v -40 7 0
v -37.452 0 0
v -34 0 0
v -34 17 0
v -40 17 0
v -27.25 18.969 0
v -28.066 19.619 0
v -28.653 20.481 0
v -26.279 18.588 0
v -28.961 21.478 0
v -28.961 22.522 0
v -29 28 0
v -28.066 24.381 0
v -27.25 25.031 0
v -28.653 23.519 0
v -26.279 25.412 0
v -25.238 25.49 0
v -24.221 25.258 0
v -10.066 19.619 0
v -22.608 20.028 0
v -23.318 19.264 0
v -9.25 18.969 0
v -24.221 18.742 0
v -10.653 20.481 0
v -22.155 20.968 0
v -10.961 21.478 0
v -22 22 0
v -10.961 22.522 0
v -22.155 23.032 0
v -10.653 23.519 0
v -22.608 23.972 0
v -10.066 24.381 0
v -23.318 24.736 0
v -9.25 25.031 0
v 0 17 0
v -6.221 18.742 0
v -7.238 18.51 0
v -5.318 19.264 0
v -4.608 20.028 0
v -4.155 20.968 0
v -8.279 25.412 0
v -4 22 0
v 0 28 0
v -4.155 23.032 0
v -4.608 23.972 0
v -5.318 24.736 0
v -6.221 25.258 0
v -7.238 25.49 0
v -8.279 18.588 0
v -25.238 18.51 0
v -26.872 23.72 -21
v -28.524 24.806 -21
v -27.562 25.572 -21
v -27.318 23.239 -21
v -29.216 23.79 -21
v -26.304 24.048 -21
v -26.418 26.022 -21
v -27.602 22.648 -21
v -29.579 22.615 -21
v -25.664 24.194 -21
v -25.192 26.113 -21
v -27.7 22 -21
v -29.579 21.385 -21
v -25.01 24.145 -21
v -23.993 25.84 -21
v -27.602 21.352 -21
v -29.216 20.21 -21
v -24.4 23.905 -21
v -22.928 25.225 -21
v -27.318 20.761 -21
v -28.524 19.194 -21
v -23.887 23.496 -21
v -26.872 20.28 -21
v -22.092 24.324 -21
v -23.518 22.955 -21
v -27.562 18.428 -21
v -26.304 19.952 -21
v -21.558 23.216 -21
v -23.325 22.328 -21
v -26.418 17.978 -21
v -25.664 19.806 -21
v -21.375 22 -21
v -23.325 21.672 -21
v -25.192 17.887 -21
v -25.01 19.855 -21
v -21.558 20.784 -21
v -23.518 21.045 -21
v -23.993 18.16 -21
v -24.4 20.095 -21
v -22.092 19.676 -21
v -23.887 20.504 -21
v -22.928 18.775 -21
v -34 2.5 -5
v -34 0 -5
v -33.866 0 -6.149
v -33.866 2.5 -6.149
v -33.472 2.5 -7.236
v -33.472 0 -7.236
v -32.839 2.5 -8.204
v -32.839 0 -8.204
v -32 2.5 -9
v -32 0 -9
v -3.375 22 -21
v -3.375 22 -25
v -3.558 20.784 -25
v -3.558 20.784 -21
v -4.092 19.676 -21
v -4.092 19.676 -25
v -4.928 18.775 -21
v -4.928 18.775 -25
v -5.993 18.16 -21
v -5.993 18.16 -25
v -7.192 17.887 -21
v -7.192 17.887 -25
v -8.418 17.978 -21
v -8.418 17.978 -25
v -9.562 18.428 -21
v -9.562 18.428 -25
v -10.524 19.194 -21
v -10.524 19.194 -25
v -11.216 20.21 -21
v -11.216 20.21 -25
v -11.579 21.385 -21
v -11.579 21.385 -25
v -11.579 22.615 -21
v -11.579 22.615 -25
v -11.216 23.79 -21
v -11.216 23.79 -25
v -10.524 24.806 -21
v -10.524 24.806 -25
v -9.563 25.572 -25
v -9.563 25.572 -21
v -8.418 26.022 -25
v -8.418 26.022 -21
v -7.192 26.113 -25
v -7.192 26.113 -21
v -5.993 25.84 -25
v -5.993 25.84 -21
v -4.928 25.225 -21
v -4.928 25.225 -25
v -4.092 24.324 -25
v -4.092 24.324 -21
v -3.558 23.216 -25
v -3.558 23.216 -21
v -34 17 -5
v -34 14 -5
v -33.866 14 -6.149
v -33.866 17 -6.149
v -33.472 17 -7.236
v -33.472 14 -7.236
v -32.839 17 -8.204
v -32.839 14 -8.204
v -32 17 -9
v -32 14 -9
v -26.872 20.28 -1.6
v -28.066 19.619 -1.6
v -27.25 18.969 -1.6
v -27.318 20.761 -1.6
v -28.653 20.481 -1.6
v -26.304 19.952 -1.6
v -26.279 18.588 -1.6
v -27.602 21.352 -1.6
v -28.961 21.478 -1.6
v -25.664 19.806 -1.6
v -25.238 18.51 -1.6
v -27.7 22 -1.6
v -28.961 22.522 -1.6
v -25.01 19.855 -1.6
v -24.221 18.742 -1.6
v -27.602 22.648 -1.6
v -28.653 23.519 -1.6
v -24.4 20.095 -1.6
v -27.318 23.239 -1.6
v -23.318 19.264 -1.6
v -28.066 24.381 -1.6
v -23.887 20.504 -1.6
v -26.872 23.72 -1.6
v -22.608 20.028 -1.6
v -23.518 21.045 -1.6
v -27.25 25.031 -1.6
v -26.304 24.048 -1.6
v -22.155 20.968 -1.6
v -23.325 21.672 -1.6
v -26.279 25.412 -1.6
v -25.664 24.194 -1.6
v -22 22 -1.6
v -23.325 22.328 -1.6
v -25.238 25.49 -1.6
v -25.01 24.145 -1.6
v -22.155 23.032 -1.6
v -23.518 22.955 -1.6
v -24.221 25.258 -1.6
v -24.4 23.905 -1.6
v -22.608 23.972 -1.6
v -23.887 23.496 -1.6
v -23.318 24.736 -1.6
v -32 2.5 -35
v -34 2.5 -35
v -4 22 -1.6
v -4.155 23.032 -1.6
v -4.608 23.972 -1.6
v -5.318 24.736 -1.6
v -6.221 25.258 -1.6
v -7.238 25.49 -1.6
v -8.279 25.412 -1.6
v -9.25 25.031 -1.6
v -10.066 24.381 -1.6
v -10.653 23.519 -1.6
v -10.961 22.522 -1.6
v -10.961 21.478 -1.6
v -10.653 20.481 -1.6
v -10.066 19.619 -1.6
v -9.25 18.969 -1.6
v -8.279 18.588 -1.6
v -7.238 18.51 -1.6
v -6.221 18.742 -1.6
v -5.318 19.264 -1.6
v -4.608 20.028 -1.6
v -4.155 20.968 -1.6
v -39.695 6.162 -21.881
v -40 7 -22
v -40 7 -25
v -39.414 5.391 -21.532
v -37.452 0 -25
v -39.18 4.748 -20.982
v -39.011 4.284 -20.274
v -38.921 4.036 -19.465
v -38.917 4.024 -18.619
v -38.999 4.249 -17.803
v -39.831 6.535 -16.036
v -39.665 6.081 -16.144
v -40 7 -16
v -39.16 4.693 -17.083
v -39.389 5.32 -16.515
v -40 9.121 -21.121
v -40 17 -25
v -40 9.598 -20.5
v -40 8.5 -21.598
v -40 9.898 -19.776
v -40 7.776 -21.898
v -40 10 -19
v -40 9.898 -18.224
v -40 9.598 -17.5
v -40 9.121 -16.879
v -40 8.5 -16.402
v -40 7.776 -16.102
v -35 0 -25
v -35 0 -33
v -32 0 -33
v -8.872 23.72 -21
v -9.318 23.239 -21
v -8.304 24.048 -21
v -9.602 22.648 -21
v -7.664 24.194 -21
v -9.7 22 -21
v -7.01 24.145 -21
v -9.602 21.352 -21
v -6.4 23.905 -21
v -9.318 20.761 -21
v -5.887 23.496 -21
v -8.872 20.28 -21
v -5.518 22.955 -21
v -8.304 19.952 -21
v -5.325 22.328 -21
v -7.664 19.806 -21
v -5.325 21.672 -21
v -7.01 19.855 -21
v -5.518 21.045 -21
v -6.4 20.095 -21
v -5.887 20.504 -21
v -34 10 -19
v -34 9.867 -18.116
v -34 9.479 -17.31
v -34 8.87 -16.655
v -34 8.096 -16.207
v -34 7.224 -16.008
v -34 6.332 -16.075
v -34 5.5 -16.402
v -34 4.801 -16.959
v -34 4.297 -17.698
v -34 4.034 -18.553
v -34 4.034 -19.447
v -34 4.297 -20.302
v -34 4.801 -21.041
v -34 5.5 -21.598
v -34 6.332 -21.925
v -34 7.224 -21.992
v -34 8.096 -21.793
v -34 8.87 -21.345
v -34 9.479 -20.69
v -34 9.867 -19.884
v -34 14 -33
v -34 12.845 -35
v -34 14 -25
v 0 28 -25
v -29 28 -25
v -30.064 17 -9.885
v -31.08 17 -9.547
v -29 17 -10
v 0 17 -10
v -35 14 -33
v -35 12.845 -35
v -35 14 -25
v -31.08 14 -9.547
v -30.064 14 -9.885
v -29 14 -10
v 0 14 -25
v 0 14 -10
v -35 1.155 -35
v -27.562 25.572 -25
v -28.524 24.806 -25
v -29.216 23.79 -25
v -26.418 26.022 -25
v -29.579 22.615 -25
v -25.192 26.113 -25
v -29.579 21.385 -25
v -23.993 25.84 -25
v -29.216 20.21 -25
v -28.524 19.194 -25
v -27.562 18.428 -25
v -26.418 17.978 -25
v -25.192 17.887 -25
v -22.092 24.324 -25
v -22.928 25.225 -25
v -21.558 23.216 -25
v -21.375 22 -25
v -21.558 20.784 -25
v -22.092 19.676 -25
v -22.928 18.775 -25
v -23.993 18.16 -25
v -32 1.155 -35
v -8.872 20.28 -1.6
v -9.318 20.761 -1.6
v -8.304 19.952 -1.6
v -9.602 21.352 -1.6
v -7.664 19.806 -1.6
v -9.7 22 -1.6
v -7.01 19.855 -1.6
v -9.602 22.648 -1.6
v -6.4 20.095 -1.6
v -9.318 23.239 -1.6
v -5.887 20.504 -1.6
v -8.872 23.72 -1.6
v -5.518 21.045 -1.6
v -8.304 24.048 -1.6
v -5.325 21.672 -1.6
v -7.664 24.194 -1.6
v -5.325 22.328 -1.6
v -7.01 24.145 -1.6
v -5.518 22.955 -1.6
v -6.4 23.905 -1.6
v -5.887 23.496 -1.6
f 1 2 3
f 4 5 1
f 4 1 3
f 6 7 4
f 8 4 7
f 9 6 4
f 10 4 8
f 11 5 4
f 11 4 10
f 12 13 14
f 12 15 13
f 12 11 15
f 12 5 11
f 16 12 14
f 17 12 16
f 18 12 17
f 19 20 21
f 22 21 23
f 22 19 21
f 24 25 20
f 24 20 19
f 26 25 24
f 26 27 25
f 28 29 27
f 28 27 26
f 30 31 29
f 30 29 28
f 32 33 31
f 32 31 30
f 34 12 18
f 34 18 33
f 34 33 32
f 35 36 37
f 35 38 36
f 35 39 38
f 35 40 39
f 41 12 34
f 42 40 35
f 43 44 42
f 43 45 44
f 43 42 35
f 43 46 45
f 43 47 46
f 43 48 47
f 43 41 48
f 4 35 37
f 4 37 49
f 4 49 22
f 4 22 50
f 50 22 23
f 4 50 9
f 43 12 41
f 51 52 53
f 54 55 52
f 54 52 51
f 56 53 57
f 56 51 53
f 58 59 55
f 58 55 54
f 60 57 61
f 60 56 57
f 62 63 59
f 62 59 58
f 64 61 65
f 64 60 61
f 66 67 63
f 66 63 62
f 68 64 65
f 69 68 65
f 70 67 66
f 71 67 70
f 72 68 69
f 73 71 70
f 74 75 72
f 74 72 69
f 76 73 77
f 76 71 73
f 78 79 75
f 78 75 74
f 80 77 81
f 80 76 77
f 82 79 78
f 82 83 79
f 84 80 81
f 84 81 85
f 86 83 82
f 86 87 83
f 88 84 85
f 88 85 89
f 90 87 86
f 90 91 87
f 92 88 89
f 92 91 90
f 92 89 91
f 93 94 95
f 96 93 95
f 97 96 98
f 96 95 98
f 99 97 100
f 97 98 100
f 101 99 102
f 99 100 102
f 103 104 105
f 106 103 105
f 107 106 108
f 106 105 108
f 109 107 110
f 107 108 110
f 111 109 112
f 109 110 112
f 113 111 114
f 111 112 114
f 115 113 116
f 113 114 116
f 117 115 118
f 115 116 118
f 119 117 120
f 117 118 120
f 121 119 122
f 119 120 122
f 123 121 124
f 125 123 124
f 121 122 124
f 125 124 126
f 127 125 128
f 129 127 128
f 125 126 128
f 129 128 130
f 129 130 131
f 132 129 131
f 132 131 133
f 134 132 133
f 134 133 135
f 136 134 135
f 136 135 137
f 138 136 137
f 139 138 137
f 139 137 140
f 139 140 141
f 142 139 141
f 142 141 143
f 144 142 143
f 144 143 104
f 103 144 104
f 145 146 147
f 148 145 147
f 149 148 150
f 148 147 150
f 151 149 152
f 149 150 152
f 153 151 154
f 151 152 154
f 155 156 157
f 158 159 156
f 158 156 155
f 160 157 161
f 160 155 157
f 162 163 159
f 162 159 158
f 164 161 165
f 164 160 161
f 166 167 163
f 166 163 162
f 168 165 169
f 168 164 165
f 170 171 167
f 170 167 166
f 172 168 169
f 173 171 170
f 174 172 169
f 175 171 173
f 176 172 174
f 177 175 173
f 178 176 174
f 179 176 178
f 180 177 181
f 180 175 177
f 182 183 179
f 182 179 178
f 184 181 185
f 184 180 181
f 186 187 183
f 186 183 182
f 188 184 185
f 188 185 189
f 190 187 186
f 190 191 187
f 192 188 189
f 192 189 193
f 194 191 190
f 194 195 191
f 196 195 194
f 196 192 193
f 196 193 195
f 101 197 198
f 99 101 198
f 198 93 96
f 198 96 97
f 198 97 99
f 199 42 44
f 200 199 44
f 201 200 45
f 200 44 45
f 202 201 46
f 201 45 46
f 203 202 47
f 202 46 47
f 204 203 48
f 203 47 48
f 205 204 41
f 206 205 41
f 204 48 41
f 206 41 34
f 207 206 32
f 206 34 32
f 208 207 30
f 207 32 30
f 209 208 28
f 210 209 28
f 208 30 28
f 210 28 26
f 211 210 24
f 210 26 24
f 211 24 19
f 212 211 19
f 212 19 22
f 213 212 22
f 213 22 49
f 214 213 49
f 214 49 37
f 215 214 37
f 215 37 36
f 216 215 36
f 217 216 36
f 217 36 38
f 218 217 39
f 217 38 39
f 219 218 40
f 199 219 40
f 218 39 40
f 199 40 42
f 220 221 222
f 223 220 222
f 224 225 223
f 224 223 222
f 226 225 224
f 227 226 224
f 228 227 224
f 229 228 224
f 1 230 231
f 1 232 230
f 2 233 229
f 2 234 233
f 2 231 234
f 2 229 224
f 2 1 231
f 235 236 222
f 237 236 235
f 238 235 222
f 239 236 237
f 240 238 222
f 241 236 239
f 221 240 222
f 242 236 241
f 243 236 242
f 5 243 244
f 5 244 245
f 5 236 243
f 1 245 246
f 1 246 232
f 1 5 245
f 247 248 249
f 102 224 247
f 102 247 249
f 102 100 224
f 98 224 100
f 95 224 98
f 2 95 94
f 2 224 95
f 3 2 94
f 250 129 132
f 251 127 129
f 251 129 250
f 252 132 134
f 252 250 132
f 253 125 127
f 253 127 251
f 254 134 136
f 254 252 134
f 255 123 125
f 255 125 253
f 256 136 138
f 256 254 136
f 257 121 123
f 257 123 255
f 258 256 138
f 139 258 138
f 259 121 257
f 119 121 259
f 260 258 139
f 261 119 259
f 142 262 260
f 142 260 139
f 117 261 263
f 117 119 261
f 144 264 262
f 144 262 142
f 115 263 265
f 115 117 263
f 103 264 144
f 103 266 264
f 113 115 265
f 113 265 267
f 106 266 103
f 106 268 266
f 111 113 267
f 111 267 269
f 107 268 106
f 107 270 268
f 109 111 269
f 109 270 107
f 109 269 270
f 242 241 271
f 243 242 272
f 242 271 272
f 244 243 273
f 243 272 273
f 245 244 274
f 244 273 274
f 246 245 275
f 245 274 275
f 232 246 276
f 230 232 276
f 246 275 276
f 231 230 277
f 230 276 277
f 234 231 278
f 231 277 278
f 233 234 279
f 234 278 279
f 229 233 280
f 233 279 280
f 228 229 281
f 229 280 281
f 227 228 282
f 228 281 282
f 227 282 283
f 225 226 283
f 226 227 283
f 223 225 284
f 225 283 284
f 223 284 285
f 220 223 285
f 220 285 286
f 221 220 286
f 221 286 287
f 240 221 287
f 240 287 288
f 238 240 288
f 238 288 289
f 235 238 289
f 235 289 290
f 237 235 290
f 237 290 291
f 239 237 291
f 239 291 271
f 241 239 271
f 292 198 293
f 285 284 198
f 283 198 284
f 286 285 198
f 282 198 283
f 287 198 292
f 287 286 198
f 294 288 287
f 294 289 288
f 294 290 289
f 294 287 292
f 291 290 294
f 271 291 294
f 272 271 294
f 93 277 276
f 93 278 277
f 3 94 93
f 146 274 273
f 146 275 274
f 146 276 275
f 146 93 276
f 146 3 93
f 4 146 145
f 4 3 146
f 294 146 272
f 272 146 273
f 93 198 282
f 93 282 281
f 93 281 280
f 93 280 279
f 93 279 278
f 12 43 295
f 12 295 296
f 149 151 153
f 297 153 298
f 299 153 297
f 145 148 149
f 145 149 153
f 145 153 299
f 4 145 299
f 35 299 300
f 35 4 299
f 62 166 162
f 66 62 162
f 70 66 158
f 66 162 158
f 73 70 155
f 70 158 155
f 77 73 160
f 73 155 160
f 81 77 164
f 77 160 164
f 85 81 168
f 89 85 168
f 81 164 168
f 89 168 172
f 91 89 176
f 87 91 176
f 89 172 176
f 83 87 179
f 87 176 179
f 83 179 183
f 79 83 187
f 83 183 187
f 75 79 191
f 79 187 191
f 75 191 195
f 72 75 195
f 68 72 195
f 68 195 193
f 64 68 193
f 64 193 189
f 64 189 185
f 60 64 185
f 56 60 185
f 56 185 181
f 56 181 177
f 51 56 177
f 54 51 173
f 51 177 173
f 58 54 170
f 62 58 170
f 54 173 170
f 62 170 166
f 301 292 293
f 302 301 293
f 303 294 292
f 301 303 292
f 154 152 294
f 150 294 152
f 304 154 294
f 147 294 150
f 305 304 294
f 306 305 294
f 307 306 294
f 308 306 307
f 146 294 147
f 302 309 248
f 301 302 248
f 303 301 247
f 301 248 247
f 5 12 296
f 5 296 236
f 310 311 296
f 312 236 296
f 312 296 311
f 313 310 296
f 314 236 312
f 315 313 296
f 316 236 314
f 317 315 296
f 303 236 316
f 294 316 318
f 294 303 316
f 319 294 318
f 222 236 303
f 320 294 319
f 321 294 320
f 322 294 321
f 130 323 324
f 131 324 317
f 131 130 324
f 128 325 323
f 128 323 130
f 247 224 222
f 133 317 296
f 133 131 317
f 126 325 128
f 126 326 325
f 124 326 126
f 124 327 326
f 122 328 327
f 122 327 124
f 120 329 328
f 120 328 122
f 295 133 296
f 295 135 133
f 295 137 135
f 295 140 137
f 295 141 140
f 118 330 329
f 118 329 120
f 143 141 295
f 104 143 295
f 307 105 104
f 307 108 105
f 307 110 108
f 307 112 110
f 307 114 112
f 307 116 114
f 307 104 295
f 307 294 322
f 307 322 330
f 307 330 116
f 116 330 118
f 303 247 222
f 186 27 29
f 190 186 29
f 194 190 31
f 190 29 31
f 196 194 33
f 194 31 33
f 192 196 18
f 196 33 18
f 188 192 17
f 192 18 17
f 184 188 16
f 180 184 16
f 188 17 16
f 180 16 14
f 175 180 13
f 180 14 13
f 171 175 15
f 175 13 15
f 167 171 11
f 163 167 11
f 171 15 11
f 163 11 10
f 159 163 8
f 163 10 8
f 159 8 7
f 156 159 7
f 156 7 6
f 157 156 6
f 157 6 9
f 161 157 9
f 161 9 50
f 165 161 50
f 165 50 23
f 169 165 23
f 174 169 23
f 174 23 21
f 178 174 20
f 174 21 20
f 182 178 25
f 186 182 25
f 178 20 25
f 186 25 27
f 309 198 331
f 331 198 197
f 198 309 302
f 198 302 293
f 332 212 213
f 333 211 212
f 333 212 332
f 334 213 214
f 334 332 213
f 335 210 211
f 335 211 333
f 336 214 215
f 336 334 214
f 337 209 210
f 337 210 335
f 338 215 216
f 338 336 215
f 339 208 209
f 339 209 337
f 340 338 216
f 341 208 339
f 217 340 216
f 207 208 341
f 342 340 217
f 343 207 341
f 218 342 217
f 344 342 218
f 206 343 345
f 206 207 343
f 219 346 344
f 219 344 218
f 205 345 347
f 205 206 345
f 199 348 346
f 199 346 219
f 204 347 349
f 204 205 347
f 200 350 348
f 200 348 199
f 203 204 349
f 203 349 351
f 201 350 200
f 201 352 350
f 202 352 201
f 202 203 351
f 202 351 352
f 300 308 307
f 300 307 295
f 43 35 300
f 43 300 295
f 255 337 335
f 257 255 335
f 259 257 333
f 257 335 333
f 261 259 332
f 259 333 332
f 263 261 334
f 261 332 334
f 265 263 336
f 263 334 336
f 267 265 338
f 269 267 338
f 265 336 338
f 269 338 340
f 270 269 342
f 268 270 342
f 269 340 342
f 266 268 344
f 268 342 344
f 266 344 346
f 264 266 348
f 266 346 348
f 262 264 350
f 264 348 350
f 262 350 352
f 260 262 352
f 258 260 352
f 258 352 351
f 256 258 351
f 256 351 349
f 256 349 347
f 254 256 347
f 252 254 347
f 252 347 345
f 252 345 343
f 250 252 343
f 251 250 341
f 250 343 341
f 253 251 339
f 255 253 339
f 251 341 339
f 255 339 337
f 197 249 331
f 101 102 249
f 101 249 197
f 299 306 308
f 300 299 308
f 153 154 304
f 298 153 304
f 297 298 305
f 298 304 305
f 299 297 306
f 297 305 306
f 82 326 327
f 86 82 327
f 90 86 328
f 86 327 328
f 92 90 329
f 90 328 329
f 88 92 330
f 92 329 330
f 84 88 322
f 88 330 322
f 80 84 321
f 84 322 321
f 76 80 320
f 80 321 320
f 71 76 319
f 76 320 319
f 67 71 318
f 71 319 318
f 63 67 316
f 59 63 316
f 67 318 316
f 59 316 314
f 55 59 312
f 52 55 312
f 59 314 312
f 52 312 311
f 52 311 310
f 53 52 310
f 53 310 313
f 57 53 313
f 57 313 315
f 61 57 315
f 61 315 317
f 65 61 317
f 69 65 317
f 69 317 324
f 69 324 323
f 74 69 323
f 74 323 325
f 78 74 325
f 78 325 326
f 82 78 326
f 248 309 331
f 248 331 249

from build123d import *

# Parameters (mm, degrees)
F1_DEPTH        = 35
F3_DEPTH        = 17
F2_W            = 2.4522083601
F2_H            = 10
F2_W_2          = 2.5477916399
F2_W_3          = 32
F4_DEPTH        = 28.001
F5_W            = 2
F5_H            = 10
F6_DEPTH        = 14
F7_R            = 3
F8_DEPTH        = 40.001
F10_D           = 4.4
F10_CBORE_D     = 8.25
F10_CBORE_DEPTH = 4
F11_R           = 3.5
F11_R_2         = 2.2
F12_DEPTH       = 1.6


with BuildPart() as f1:
    # F0 (on Top) → F1 (new body)
    with BuildSketch(Plane.XY):
        Polygon((-34, 14), (0, 14), (0, 28), (-29, 28), (-40, 17), (-40, 7), (-37.4522083601, 0), (-32, 0), (-32, 2.5), (-34, 2.5), align=None)
    extrude(amount=-F1_DEPTH)

    # F2 (on face) → F3 (cut)
    with BuildSketch(Plane.XZ):
        with BuildLine():
            Line((0, 0), (-32, 0))
            Line((-32, 0), (-32, -9))
            ThreePointArc((-32, -9), (-30.5811388301, -9.7434164903), (-29, -10))
            Line((-29, -10), (0, -10))
            Line((0, -10), (0, 0))
        make_face()
        with BuildLine():
            Line((-32, 0), (-34, 0))
            Line((-34, 0), (-34, -5))
            ThreePointArc((-34, -5), (-33.472135955, -7.2360679775), (-32, -9))
            Line((-32, -9), (-32, 0))
        make_face()
    extrude(amount=-F3_DEPTH, mode=Mode.SUBTRACT)

    # F2 (on face) → F4 (cut, through all)
    with BuildSketch(Plane.XZ):
        with Locations((-36.2261041801, -30)):
            Rectangle(F2_W, F2_H)
        with Locations((-38.7261041801, -30)):
            Rectangle(F2_W_2, F2_H)
        with Locations((-16, -30)):
            Rectangle(F2_W_3, F2_H)
    extrude(amount=-F4_DEPTH, mode=Mode.SUBTRACT)

    # F5 (on face) → F6 (cut, through all)
    with BuildSketch(Plane(origin=(0, 28, 0), x_dir=(-1, 0, 0), z_dir=(0, 1, 0))):
        with Locations((33, -30)):
            Rectangle(F5_W, F5_H)
    extrude(amount=-F6_DEPTH, mode=Mode.SUBTRACT)

    # F7 (on face) → F8 (cut, through all)
    with BuildSketch(Plane.YZ):
        Polygon((23, -35), (23, -25), (14, -25), (14, -33), (14, -35), align=None)
        Polygon((14, -35), (14, -33), (12.8452994616, -35), align=None)
        with Locations((7, -19)):
            Circle(F7_R)
        Polygon((1.1547005384, -35), (0, -33), (0, -35), align=None)
    extrude(amount=-F8_DEPTH, mode=Mode.SUBTRACT)

    # F10 (through all)
    with Locations(Plane(origin=(0, 0, -25), x_dir=(1, 0, 0), z_dir=(0, 0, -1))):
        with Locations((-25.5, -22), (-7.5, -22)):
            CounterBoreHole(F10_D / 2, F10_CBORE_D / 2, F10_CBORE_DEPTH)

    # F11 (on face) → F12 (cut)
    with BuildSketch(Plane.XY):
        with Locations((-25.5, 22)):
            Circle(F11_R)
        with Locations((-25.5, 22)):
            Circle(F11_R_2, mode=Mode.SUBTRACT)
        with Locations((-7.5, 22)):
            Circle(F11_R)
        with Locations((-7.5, 22)):
            Circle(F11_R_2, mode=Mode.SUBTRACT)
    extrude(amount=-F12_DEPTH, mode=Mode.SUBTRACT)


solid = f1.part
